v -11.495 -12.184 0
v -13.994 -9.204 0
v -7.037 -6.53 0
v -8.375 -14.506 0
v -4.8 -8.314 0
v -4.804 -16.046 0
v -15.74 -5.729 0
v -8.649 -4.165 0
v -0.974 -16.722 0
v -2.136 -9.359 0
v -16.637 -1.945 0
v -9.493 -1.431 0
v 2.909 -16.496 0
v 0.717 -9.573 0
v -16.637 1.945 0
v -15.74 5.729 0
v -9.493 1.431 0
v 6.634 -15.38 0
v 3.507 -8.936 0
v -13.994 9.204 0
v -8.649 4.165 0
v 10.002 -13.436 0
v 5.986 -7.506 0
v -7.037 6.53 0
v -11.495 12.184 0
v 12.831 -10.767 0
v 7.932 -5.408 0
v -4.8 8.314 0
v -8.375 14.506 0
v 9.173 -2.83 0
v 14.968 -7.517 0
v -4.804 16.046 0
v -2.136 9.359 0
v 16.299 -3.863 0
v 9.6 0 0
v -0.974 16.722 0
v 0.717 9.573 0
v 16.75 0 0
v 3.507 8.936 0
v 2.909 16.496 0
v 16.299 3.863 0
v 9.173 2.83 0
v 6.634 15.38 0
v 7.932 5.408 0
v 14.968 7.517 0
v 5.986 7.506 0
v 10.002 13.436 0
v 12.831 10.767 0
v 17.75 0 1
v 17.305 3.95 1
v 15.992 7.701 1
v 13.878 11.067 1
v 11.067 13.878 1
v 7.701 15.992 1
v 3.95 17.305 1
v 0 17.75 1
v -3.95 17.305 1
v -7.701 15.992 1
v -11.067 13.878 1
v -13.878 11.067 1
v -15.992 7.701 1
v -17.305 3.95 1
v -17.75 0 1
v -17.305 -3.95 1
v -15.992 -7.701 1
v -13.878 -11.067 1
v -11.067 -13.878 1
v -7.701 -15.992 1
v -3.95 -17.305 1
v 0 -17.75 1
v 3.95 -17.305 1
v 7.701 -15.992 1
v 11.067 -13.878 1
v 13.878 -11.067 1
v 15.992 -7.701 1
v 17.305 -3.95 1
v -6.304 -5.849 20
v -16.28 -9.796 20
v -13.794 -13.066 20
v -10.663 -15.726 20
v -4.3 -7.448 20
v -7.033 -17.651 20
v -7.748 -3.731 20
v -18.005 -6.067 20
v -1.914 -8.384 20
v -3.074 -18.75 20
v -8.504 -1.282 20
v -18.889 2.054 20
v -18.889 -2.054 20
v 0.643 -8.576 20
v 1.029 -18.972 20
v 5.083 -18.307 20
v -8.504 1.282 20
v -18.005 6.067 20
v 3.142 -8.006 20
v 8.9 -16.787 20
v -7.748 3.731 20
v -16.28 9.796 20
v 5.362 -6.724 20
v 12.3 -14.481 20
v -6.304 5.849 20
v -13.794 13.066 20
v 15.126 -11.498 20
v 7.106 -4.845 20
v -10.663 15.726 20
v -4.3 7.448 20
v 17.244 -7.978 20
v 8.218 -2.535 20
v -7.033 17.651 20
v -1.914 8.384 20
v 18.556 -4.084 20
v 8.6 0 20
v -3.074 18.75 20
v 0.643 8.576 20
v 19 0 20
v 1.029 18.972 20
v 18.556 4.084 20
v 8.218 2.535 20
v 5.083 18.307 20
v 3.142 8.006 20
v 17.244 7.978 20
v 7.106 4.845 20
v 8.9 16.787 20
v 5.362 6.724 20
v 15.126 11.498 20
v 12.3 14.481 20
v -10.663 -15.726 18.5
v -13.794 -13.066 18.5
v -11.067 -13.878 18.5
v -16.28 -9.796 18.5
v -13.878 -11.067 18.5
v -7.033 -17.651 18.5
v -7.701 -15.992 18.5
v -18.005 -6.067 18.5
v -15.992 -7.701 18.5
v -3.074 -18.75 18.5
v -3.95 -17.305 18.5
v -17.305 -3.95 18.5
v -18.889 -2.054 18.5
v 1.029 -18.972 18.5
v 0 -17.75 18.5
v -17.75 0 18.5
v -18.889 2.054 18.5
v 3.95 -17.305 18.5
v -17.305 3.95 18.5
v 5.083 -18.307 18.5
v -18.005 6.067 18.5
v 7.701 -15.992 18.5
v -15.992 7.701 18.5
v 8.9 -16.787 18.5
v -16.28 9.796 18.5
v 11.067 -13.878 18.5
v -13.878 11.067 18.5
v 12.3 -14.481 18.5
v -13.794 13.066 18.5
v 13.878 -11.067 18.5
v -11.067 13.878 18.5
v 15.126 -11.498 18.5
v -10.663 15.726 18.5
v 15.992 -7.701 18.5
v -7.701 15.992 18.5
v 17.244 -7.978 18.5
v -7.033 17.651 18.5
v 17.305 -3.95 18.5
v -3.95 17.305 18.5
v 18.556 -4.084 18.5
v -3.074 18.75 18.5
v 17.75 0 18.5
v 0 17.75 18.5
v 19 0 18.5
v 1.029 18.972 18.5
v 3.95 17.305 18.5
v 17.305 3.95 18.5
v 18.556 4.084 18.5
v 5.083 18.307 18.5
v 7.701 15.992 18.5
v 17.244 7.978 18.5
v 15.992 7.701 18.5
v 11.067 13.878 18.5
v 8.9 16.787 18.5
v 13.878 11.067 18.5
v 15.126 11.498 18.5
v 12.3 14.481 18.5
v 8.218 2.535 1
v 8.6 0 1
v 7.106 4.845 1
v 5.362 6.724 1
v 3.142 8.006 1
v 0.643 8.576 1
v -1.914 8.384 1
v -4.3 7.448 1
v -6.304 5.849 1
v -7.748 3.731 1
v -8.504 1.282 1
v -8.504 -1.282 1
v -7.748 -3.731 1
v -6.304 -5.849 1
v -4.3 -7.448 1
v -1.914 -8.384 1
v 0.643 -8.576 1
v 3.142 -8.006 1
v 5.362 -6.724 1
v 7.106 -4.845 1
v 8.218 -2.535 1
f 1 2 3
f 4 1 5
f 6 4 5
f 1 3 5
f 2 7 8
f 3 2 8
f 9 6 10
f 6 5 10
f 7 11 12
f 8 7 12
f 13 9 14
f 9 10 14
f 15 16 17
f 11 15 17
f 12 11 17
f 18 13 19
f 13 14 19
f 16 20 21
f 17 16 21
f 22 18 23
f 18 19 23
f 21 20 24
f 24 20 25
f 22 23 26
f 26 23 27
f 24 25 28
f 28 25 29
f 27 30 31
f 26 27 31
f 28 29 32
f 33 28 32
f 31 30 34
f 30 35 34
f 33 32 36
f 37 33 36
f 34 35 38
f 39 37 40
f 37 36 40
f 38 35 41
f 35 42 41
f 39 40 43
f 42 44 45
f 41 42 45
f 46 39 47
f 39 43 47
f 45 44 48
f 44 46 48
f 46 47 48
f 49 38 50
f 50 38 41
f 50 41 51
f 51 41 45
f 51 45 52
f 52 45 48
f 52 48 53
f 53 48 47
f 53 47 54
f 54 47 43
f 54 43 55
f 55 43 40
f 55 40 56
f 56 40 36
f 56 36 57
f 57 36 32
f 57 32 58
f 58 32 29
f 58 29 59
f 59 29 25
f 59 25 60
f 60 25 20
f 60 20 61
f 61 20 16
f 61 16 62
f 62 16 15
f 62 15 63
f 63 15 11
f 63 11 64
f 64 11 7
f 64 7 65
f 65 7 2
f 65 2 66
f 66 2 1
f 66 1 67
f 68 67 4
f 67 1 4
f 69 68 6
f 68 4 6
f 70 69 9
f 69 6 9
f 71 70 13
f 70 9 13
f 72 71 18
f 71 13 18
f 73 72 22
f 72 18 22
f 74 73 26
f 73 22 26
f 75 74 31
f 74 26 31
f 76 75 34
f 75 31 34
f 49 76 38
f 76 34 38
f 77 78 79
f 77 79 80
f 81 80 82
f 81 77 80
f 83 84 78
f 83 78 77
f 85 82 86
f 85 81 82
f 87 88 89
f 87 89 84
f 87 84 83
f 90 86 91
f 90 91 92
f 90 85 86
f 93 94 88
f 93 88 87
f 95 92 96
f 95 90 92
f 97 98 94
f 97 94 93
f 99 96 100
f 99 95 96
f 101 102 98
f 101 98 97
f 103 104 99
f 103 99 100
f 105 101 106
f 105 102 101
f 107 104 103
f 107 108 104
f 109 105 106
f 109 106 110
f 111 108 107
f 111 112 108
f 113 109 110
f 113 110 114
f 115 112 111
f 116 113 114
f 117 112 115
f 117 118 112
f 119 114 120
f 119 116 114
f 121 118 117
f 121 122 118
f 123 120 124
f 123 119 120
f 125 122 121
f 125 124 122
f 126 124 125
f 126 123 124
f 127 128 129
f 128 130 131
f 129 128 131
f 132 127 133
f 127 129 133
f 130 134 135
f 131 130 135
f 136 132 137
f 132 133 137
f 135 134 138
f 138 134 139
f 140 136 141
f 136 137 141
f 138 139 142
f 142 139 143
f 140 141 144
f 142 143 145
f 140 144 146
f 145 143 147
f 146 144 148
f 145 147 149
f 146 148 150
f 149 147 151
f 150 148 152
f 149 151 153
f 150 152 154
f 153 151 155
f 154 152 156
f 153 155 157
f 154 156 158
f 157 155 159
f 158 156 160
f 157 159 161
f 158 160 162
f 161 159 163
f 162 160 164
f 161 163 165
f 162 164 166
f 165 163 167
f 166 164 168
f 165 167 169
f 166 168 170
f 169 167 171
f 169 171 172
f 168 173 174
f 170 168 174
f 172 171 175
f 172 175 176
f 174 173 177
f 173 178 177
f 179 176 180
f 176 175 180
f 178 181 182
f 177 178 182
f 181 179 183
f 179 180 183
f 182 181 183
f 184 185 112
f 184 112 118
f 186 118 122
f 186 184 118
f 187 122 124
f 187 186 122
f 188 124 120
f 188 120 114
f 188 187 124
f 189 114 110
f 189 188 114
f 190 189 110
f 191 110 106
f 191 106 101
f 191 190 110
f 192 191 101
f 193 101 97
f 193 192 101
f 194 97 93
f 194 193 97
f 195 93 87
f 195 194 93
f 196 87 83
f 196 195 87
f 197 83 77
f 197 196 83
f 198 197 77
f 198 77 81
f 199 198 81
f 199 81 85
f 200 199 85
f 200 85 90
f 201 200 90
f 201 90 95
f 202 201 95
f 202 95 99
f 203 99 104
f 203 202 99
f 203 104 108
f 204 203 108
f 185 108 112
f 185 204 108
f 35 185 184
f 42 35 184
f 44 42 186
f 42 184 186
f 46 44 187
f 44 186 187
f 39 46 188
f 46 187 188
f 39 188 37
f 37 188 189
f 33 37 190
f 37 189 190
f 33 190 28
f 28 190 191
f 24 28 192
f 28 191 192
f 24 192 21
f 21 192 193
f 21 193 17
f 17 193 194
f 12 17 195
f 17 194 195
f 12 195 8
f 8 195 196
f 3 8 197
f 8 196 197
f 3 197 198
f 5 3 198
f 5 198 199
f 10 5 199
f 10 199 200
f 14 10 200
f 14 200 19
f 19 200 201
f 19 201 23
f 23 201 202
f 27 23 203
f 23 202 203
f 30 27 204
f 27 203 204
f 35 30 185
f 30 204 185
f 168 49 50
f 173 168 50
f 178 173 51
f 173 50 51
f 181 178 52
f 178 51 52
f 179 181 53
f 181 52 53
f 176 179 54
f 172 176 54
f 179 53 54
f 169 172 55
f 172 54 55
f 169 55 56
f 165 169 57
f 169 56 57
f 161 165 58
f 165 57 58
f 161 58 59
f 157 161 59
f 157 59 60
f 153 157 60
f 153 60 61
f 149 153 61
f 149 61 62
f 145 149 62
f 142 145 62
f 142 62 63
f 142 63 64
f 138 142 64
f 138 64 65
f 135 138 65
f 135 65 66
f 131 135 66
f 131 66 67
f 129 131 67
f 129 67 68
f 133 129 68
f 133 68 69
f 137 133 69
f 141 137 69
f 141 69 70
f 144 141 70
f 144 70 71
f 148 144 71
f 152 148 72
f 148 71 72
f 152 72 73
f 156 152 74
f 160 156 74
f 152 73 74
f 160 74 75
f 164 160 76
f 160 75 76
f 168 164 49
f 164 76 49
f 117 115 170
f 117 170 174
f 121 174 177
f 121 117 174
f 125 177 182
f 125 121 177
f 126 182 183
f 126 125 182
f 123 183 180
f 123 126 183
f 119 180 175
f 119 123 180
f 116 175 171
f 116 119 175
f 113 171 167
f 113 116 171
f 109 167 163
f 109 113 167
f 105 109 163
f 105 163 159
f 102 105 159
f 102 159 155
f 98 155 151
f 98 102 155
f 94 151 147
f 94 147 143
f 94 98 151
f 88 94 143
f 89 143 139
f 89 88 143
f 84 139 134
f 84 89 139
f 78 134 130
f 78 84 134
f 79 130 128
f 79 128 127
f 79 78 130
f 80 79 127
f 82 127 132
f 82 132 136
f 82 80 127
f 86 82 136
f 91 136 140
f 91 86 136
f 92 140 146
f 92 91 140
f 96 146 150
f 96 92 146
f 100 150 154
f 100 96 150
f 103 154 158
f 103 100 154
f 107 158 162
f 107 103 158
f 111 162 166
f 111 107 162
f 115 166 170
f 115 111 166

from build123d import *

# Parameters (mm, degrees)
F0_R     = 17.75
F0_R_2   = 8.6
F1_DEPTH = 20
F2_R     = 19
F2_R_2   = 17.75
F3_DEPTH = 1.5
F4_SIZE  = 1
F5_SIZE  = 1


with BuildPart() as f1:
    # F0 (on Top) → F1 (new body)
    with BuildSketch(Plane.XY):
        Circle(F0_R)
        Circle(F0_R_2, mode=Mode.SUBTRACT)
    extrude(amount=F1_DEPTH)

    # F2 (on face) → F3 (join)
    with BuildSketch(Plane.XY.offset(20)):
        Circle(F2_R)
        Circle(F2_R_2, mode=Mode.SUBTRACT)
    extrude(amount=-F3_DEPTH)

    # F4
    f4_edges = [f1.edges().sort_by_distance(p)[0] for p in [
        (-17.75, 0, 0),
    ]]
    chamfer(f4_edges, length=F4_SIZE)

    # F5
    f5_edges = [f1.edges().sort_by_distance(p)[0] for p in [
        (-8.6, 0, 0),
    ]]
    chamfer(f5_edges, length=F5_SIZE)


solid = f1.part
